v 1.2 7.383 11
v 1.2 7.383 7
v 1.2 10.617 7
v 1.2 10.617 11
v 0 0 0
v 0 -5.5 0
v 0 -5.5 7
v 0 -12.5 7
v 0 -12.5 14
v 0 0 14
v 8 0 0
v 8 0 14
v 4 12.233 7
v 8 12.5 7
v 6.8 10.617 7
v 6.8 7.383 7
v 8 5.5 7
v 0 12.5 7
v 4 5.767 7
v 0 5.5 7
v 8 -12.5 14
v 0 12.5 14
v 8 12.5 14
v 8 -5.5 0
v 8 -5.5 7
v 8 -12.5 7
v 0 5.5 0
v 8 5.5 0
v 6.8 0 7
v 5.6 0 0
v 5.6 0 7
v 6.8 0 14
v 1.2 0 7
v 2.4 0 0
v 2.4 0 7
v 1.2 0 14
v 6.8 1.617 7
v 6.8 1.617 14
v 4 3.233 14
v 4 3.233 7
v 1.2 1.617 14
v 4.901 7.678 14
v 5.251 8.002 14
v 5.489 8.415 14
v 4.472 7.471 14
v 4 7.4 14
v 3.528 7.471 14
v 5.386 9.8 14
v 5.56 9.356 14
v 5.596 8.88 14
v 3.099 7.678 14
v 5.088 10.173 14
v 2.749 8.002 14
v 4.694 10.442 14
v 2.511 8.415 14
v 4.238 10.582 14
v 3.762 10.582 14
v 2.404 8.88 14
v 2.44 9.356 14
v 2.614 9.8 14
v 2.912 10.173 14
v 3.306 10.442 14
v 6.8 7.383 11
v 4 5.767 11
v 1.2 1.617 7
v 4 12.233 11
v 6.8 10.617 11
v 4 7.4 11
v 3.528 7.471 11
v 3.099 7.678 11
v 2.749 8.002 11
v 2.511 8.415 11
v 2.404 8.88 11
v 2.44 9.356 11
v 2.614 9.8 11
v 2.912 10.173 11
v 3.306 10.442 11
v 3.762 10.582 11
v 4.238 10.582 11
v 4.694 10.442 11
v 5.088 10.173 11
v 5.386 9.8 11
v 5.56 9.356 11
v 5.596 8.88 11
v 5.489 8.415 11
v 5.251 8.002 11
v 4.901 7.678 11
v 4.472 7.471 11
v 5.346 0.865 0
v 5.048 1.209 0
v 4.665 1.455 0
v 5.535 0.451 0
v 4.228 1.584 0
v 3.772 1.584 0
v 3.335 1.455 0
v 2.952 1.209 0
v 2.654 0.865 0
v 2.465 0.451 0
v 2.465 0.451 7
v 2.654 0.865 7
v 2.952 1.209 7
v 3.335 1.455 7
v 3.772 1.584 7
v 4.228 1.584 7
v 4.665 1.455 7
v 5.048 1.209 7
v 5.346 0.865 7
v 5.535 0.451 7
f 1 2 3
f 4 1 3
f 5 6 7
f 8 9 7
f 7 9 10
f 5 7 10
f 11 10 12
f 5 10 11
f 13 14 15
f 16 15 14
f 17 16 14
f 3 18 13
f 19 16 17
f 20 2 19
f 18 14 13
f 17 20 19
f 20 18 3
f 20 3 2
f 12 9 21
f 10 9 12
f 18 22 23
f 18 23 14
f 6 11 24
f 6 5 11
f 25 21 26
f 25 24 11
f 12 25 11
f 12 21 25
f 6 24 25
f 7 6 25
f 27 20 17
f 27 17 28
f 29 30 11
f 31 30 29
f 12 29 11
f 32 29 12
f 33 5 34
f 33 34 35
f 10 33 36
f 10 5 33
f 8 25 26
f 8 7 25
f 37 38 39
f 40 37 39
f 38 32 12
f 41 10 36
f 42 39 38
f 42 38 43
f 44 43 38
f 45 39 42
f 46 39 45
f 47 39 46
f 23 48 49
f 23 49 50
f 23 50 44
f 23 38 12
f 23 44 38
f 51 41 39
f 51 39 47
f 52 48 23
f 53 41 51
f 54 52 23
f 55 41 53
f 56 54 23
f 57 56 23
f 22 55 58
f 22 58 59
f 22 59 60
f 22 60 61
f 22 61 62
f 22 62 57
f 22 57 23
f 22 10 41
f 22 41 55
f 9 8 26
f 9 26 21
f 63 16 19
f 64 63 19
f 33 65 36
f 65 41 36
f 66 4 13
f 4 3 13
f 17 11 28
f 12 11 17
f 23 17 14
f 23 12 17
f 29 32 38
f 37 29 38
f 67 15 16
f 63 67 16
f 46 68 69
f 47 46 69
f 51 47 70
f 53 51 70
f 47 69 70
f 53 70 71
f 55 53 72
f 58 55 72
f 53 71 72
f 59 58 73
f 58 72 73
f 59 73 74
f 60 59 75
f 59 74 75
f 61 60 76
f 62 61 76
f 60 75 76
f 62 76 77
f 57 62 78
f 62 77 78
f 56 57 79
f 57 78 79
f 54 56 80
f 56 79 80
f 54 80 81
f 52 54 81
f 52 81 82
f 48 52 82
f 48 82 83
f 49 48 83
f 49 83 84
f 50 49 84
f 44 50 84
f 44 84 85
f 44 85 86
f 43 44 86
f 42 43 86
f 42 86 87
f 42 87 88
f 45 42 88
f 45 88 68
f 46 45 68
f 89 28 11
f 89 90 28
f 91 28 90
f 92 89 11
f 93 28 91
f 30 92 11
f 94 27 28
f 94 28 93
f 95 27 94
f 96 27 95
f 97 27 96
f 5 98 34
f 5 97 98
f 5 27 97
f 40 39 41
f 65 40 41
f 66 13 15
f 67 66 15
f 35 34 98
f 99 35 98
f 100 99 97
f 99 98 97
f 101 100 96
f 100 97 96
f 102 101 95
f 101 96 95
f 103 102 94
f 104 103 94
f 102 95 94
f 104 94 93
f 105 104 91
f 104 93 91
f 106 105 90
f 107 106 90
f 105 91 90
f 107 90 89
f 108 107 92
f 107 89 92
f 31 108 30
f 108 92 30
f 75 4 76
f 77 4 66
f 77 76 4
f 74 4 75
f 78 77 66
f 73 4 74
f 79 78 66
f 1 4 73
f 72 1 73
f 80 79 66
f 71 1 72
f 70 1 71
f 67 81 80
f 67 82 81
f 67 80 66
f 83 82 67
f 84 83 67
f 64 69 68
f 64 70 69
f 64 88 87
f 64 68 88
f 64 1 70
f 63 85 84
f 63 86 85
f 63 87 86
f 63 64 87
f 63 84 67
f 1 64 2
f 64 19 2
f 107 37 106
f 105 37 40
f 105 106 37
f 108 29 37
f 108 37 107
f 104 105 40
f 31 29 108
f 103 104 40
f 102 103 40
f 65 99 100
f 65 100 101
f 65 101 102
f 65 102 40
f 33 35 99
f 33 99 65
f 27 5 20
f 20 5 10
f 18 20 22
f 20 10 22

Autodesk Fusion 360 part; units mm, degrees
sketch "Skizze1" plane through (0, 0, 0) normal (1, 0, 0) x (0, 1, 0)
  line L0 (0, 0) -> (0, 14)
  line L1 (0, 14) -> (12.5, 14)
  line L2 (12.5, 14) -> (12.5, 7)
  line L3 (12.5, 7) -> (5.5, 7)
  line L4 (5.5, 7) -> (5.5, 0)
  line L5 (5.5, 0) -> (0, 0)
  dimension "d1" = 5.5
  dimension "d2" = 7
  dimension "d3" = 14
  dimension "d4" = 12.5
extrude "Extrusion1" add sketch "Skizze1" along normal blind 8 makes body 1
sketch "Skizze2" plane through (0, 0, 14) normal (0, 0, 1) x (-1, 0, 0)
  line L0 (0, -12.5) -> (0, 0)
  line L1 (0, 0) -> (-8, 0)
  line L2 (-8, 0) -> (-8, -12.5)
  line L3 (-8, -12.5) -> (0, -12.5)
  point P0 (-4, 0)
  point P1 (-4, -9)
  dimension "d7" = 4
  dimension "d8" = 4
  dimension "d10" = 3.5
hole "Bohrung1" at (4, 0, 14) at (4, 9, 14) direction (0, 0, -1) diameter 3.2 end through all bodies 1 1
sketch "Skizze3" plane through (0, 0, 14) normal (0, 0, 1) x (-1, 0, 0)
  arc A0 (-5.6, 0) -> (-2.4, 0) centre (-4, 0) ccw
  line L0 (-5.6, 0) -> (-8, 0)
  line L1 (-8, 0) -> (-8, -12.5)
  line L2 (-8, -12.5) -> (0, -12.5)
  line L3 (0, -12.5) -> (0, 0)
  line L4 (0, 0) -> (-2.4, 0)
  circle A1 centre (-4, -9) radius 1.6
  line L5 (-1.2, 1.6166) -> (-4, 3.2332)
  line L6 (-4, 3.2332) -> (-6.8, 1.6166)
  line L7 (-6.8, 1.6166) -> (-6.8, -1.6166)
  line L8 (-6.8, -1.6166) -> (-4, -3.2332)
  line L9 (-4, -3.2332) -> (-1.2, -1.6166)
  line L10 (-1.2, -1.6166) -> (-1.2, 1.6166)
  point P0 (-4, 0)
  dimension "d14" = 5.6
extrude "Extrusion2" cut sketch "Skizze3" against normal blind 7 contours A0 L0 L4 L7 L8 L9 L10 bodies 1
sketch "Skizze4" plane through (0, 0, 7) normal (0, 0, -1) x (1, 0, 0)
  circle A0 centre (4, -9) radius 1.6
  line L0 (0, -5.5) -> (0, -12.5)
  line L1 (0, -12.5) -> (8, -12.5)
  line L2 (8, -12.5) -> (8, -5.5)
  line L3 (8, -5.5) -> (0, -5.5)
  line L4 (6.8, -7.3834) -> (4, -5.7668)
  line L5 (4, -5.7668) -> (1.2, -7.3834)
  line L6 (1.2, -7.3834) -> (1.2, -10.6166)
  line L7 (1.2, -10.6166) -> (4, -12.2332)
  line L8 (4, -12.2332) -> (6.8, -10.6166)
  line L9 (6.8, -10.6166) -> (6.8, -7.3834)
  point P0 (4, -9)
  dimension "d17" = 5.6
extrude "Extrusion3" cut sketch "Skizze4" against normal blind 4 contours L4 L5 L6 L7 L8 L9 bodies 1
mirror "Spiegeln1" about plane through (0, 0, 0) normal (0, -1, 0) of "Extrusion3", "Bohrung1", "Extrusion2", "Extrusion1" makes body 2
equation "d1 = ( 11 / 2 ) * 1 mm"
equation "d4 = ( 25 / 2 ) * 1 mm"
